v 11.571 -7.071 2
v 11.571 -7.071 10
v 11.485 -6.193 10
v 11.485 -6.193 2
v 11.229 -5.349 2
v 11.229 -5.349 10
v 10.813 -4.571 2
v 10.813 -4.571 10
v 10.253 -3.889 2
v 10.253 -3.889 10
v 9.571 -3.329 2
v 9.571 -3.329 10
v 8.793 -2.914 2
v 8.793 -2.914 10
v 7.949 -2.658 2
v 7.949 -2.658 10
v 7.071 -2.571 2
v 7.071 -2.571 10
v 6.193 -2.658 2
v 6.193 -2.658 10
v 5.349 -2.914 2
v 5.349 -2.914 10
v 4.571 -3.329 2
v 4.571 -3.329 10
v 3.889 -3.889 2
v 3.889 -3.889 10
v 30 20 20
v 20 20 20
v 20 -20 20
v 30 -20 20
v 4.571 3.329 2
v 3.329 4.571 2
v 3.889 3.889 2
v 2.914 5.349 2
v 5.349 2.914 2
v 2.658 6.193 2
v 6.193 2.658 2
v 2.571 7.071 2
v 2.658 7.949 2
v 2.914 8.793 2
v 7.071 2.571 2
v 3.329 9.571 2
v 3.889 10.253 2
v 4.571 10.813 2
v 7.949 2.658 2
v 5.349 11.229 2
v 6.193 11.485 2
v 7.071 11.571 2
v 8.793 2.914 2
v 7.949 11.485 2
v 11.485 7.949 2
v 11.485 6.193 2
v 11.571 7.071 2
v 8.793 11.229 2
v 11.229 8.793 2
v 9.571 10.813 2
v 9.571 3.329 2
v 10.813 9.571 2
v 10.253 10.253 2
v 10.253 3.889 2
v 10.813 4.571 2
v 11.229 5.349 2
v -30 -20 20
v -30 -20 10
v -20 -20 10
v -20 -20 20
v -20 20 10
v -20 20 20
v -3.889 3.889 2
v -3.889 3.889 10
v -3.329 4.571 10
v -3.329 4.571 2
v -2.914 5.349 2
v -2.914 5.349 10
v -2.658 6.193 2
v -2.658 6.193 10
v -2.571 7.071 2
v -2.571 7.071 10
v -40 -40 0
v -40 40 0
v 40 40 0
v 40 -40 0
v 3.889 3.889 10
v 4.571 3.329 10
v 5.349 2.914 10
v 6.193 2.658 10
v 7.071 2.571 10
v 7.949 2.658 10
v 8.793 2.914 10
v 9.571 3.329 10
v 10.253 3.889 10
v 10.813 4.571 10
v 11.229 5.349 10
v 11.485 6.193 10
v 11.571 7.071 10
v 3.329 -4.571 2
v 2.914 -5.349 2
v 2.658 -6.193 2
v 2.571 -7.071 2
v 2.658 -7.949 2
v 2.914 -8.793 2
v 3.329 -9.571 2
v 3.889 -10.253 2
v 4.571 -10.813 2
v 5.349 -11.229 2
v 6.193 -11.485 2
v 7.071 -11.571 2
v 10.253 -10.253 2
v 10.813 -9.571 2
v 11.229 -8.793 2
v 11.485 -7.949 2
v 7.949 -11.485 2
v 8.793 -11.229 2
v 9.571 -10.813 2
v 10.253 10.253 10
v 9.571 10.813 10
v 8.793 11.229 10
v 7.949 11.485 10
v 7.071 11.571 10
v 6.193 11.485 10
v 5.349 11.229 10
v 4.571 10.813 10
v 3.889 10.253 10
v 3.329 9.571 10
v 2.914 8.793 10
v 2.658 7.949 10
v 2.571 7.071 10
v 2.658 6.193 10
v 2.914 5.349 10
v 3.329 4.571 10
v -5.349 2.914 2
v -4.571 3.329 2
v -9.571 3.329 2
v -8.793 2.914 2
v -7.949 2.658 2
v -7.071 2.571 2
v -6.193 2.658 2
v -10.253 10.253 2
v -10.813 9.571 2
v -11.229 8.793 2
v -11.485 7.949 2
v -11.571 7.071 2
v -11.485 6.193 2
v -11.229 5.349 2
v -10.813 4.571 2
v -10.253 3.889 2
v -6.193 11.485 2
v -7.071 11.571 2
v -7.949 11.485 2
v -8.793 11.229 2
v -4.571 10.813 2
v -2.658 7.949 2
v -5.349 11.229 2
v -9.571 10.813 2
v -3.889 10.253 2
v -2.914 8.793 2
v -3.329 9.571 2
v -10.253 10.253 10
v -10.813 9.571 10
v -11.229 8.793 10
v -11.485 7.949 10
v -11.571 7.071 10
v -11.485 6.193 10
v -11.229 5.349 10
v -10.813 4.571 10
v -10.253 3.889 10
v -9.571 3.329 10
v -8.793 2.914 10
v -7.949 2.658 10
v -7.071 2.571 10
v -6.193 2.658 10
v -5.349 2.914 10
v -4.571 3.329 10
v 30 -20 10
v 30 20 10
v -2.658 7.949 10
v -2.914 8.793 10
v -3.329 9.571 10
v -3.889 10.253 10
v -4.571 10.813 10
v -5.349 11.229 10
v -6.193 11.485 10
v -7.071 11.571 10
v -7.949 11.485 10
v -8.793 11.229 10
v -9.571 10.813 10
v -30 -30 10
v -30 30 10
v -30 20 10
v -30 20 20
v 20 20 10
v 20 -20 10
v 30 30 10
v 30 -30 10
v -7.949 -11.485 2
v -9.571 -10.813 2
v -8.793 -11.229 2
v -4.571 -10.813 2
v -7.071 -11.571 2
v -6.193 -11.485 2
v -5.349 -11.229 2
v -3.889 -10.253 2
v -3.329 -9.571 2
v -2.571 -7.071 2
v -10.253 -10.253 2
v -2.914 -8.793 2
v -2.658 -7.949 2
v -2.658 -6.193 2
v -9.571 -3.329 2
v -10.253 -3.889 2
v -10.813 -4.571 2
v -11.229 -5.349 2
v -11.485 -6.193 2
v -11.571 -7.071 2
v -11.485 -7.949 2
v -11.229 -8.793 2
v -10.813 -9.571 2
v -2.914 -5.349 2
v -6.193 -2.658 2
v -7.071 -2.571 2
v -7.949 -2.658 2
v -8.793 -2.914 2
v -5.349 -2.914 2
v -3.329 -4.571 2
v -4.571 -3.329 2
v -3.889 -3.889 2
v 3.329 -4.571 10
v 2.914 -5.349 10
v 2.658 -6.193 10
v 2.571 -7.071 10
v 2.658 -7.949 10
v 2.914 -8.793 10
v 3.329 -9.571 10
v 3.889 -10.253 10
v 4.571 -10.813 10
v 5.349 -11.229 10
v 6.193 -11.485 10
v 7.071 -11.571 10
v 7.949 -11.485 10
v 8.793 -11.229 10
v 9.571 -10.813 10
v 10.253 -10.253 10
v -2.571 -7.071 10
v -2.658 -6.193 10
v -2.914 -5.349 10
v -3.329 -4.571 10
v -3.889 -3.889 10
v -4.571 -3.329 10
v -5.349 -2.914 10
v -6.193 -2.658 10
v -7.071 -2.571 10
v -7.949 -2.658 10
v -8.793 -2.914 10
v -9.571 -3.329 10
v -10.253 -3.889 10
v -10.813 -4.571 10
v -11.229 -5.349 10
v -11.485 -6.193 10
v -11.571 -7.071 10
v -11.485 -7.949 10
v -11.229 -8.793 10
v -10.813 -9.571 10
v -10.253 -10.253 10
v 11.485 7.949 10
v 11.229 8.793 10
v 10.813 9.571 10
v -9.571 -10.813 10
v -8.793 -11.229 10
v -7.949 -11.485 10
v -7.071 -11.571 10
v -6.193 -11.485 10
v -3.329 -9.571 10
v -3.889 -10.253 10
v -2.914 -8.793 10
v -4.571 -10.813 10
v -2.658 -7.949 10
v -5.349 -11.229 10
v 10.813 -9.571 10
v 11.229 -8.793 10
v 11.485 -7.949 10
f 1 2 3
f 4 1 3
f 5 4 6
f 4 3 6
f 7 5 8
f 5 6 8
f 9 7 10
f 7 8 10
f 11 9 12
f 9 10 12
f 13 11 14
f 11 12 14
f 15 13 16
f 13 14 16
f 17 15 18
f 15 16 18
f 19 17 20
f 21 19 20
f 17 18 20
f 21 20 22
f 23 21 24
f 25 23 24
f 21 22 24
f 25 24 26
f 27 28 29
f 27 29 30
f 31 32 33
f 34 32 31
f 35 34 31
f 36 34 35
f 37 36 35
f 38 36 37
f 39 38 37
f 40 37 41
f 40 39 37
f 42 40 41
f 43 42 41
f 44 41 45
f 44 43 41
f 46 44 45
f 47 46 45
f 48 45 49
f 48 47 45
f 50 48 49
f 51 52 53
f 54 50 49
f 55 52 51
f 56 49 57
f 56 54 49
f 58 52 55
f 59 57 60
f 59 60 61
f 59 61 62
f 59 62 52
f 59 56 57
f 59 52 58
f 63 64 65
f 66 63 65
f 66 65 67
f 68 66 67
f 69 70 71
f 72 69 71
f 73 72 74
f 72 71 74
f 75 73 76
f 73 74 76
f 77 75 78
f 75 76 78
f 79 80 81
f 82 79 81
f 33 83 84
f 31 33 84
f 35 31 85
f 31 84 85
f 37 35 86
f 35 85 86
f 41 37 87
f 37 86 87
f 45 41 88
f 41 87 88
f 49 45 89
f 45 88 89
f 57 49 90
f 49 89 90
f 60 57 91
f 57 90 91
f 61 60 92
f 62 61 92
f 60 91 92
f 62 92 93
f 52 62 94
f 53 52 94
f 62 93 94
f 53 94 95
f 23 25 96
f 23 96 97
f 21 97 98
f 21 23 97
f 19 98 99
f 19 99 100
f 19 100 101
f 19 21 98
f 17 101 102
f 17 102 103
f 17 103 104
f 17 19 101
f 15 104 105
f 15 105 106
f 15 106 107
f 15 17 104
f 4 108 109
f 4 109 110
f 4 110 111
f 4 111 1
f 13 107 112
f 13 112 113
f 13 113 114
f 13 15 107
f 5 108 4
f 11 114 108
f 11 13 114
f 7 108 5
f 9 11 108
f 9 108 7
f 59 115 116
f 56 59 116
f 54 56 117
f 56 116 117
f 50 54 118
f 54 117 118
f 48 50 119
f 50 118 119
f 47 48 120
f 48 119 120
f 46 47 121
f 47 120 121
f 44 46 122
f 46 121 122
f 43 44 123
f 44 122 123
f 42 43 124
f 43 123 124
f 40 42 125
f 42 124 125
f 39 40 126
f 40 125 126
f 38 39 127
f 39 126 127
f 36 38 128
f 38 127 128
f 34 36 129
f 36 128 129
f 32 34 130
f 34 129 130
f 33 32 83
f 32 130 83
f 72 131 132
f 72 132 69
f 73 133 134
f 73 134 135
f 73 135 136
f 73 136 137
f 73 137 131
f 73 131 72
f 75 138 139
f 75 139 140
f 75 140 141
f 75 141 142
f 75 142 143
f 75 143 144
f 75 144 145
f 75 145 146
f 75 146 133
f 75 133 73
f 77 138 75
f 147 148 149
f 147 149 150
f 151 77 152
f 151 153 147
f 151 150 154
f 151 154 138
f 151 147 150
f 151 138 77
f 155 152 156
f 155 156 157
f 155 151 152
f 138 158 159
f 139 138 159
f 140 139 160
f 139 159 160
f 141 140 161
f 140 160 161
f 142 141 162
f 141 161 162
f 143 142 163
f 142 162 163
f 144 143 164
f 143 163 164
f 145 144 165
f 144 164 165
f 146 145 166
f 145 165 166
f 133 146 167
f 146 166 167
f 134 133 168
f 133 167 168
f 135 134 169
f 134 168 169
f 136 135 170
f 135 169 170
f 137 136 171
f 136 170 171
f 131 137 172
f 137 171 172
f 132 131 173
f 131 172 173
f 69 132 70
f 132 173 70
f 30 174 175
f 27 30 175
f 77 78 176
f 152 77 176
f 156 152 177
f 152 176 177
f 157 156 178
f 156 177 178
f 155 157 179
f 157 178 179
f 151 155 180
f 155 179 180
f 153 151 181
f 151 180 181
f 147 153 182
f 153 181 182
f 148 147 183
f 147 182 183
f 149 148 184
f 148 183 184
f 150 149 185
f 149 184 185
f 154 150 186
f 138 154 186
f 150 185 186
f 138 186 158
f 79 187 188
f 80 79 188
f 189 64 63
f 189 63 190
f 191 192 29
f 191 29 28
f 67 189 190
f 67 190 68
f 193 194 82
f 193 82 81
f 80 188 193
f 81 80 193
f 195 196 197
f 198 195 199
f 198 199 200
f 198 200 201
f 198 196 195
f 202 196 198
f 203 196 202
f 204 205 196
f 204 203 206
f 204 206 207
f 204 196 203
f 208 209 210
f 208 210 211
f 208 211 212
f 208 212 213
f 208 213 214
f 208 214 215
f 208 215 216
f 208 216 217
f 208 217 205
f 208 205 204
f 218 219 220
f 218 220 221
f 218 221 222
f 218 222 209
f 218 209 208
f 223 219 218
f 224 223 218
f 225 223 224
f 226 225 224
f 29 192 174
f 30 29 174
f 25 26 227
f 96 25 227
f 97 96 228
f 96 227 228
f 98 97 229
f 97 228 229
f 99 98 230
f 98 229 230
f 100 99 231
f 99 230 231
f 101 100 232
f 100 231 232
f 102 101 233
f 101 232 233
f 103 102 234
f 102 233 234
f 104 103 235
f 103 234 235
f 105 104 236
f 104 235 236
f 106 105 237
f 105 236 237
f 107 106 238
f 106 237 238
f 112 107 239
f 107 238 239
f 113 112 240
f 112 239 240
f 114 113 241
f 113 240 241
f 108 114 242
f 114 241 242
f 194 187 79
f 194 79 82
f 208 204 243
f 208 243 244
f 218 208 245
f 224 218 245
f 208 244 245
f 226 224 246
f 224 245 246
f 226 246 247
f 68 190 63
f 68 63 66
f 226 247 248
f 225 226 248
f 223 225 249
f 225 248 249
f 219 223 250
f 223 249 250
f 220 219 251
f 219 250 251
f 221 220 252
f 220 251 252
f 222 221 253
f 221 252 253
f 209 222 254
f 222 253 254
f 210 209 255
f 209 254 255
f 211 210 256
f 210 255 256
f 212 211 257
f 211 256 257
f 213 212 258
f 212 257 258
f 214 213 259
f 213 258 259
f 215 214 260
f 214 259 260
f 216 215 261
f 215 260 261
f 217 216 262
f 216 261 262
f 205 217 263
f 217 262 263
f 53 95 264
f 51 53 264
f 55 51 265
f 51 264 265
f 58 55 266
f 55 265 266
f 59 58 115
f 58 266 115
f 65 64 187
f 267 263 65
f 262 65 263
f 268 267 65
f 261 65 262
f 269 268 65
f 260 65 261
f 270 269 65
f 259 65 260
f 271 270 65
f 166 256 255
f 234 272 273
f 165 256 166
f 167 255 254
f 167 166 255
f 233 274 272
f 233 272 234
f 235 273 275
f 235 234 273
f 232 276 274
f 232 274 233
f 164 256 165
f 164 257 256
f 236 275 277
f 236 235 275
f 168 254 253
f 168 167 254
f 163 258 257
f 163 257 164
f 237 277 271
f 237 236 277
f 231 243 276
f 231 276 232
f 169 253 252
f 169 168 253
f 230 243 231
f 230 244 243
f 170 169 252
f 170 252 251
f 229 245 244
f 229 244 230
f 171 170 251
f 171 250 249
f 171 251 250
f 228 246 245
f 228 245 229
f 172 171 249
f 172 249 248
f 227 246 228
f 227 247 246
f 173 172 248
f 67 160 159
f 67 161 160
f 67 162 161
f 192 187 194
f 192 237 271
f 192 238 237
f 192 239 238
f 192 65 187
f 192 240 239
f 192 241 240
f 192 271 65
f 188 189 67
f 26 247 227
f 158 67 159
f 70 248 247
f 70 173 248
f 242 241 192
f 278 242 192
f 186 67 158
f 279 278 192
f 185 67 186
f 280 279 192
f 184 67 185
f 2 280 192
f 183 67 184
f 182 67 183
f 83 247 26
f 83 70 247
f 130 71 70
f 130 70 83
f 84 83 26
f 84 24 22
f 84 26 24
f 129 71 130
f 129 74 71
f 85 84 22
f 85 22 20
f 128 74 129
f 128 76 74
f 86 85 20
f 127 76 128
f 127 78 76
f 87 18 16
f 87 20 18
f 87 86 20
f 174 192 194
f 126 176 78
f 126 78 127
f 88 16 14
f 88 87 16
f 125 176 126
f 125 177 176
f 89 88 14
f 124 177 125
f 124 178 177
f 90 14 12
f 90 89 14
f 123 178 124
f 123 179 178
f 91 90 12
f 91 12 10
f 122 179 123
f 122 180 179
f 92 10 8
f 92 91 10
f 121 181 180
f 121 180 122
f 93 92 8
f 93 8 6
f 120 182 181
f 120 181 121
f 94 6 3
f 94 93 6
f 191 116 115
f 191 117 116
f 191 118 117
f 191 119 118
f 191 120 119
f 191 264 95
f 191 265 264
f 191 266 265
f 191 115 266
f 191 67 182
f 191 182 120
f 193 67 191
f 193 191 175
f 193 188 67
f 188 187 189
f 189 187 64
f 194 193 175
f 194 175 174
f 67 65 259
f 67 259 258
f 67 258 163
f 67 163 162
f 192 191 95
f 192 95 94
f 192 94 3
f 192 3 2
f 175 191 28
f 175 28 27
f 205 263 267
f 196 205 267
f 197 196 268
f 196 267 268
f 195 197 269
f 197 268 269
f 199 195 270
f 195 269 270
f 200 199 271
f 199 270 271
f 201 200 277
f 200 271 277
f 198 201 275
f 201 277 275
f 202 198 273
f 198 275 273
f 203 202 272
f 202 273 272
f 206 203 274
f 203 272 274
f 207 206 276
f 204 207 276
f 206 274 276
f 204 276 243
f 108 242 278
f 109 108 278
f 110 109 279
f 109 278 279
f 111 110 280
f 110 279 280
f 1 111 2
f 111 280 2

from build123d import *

# Parameters (mm, degrees)
F0_W     = 80
F0_H     = 80
F1_DEPTH = 10
F2_SIZE2 = 9.99999
F2_SIZE  = 9.99999
F3_W     = 10
F3_H     = 40
F4_DEPTH = 10
F6_DEPTH = 8


# Not quite as in the source:
# - a fillet or chamfer is up to 0.001 mm smaller than in the source, because OpenCascade refuses the exact size


with BuildPart() as f1:
    # F0 (on Top) → F1 (new body)
    with BuildSketch(Plane.XY):
        Rectangle(F0_W, F0_H)
    extrude(amount=F1_DEPTH)

    # F2 (size 10 and 10 in the source; OpenCascade refuses exactly that, so slightly less here)
    f2_edges = [f1.edges().sort_by_distance(p)[0] for p in [
        (0, 40, 10),
        (-40, 0, 10),
        (0, -40, 10),
        (40, 0, 10),
    ]]
    chamfer(f2_edges, length=F2_SIZE, length2=F2_SIZE2)

    # F3 (on face) → F4 (join)
    with BuildSketch(Plane.XY.offset(10)):
        with Locations((25, 0)):
            Rectangle(F3_W, F3_H)
        with Locations((-25, 0)):
            Rectangle(F3_W, F3_H)
    extrude(amount=F4_DEPTH)

    # F5 (on face) → F6 (cut)
    with BuildSketch(Plane.XY.offset(10)):
        with BuildLine():
            Line((-3.8890872965, -3.8890872965), (-10.2530483272, -10.2530483272))
            ThreePointArc((-10.2530483272, -10.2530483272), (-5.3489923662, -11.2285257082), (-2.5710678119, -7.0710678119))
            ThreePointArc((-2.5710678119, -7.0710678119), (-2.9136099156, -5.3489923662), (-3.8890872965, -3.8890872965))
        make_face()
        with BuildLine():
            Line((3.8890872965, 3.8890872965), (10.2530483272, 10.2530483272))
            ThreePointArc((10.2530483272, 10.2530483272), (3.8890872965, 10.2530483272), (3.8890872965, 3.8890872965))
        make_face()
        with BuildLine():
            ThreePointArc((-2.5710678119, 7.0710678119), (-5.3489923662, 11.2285257082), (-10.2530483272, 10.2530483272))
            Line((-10.2530483272, 10.2530483272), (-3.8890872965, 3.8890872965))
            ThreePointArc((-3.8890872965, 3.8890872965), (-2.9136099156, 5.3489923662), (-2.5710678119, 7.0710678119))
        make_face()
        with BuildLine():
            ThreePointArc((11.5710678119, 7.0710678119), (11.2285257082, 8.7931432575), (10.2530483272, 10.2530483272))
            Line((10.2530483272, 10.2530483272), (3.8890872965, 3.8890872965))
            ThreePointArc((3.8890872965, 3.8890872965), (8.7931432575, 2.9136099156), (11.5710678119, 7.0710678119))
        make_face()
        with BuildLine():
            ThreePointArc((3.8890872965, -3.8890872965), (3.8890872965, -10.2530483272), (10.2530483272, -10.2530483272))
            Line((10.2530483272, -10.2530483272), (3.8890872965, -3.8890872965))
        make_face()
        with BuildLine():
            Line((-3.8890872965, 3.8890872965), (-10.2530483272, 10.2530483272))
            ThreePointArc((-10.2530483272, 10.2530483272), (-10.2530483272, 3.8890872965), (-3.8890872965, 3.8890872965))
        make_face()
        with BuildLine():
            ThreePointArc((-3.8890872965, -3.8890872965), (-10.2530483272, -3.8890872965), (-10.2530483272, -10.2530483272))
            Line((-10.2530483272, -10.2530483272), (-3.8890872965, -3.8890872965))
        make_face()
        with BuildLine():
            Line((3.8890872965, -3.8890872965), (10.2530483272, -10.2530483272))
            ThreePointArc((10.2530483272, -10.2530483272), (11.2285257082, -8.7931432575), (11.5710678119, -7.0710678119))
            ThreePointArc((11.5710678119, -7.0710678119), (8.7931432575, -2.9136099156), (3.8890872965, -3.8890872965))
        make_face()
    extrude(amount=-F6_DEPTH, mode=Mode.SUBTRACT)


solid = f1.part
